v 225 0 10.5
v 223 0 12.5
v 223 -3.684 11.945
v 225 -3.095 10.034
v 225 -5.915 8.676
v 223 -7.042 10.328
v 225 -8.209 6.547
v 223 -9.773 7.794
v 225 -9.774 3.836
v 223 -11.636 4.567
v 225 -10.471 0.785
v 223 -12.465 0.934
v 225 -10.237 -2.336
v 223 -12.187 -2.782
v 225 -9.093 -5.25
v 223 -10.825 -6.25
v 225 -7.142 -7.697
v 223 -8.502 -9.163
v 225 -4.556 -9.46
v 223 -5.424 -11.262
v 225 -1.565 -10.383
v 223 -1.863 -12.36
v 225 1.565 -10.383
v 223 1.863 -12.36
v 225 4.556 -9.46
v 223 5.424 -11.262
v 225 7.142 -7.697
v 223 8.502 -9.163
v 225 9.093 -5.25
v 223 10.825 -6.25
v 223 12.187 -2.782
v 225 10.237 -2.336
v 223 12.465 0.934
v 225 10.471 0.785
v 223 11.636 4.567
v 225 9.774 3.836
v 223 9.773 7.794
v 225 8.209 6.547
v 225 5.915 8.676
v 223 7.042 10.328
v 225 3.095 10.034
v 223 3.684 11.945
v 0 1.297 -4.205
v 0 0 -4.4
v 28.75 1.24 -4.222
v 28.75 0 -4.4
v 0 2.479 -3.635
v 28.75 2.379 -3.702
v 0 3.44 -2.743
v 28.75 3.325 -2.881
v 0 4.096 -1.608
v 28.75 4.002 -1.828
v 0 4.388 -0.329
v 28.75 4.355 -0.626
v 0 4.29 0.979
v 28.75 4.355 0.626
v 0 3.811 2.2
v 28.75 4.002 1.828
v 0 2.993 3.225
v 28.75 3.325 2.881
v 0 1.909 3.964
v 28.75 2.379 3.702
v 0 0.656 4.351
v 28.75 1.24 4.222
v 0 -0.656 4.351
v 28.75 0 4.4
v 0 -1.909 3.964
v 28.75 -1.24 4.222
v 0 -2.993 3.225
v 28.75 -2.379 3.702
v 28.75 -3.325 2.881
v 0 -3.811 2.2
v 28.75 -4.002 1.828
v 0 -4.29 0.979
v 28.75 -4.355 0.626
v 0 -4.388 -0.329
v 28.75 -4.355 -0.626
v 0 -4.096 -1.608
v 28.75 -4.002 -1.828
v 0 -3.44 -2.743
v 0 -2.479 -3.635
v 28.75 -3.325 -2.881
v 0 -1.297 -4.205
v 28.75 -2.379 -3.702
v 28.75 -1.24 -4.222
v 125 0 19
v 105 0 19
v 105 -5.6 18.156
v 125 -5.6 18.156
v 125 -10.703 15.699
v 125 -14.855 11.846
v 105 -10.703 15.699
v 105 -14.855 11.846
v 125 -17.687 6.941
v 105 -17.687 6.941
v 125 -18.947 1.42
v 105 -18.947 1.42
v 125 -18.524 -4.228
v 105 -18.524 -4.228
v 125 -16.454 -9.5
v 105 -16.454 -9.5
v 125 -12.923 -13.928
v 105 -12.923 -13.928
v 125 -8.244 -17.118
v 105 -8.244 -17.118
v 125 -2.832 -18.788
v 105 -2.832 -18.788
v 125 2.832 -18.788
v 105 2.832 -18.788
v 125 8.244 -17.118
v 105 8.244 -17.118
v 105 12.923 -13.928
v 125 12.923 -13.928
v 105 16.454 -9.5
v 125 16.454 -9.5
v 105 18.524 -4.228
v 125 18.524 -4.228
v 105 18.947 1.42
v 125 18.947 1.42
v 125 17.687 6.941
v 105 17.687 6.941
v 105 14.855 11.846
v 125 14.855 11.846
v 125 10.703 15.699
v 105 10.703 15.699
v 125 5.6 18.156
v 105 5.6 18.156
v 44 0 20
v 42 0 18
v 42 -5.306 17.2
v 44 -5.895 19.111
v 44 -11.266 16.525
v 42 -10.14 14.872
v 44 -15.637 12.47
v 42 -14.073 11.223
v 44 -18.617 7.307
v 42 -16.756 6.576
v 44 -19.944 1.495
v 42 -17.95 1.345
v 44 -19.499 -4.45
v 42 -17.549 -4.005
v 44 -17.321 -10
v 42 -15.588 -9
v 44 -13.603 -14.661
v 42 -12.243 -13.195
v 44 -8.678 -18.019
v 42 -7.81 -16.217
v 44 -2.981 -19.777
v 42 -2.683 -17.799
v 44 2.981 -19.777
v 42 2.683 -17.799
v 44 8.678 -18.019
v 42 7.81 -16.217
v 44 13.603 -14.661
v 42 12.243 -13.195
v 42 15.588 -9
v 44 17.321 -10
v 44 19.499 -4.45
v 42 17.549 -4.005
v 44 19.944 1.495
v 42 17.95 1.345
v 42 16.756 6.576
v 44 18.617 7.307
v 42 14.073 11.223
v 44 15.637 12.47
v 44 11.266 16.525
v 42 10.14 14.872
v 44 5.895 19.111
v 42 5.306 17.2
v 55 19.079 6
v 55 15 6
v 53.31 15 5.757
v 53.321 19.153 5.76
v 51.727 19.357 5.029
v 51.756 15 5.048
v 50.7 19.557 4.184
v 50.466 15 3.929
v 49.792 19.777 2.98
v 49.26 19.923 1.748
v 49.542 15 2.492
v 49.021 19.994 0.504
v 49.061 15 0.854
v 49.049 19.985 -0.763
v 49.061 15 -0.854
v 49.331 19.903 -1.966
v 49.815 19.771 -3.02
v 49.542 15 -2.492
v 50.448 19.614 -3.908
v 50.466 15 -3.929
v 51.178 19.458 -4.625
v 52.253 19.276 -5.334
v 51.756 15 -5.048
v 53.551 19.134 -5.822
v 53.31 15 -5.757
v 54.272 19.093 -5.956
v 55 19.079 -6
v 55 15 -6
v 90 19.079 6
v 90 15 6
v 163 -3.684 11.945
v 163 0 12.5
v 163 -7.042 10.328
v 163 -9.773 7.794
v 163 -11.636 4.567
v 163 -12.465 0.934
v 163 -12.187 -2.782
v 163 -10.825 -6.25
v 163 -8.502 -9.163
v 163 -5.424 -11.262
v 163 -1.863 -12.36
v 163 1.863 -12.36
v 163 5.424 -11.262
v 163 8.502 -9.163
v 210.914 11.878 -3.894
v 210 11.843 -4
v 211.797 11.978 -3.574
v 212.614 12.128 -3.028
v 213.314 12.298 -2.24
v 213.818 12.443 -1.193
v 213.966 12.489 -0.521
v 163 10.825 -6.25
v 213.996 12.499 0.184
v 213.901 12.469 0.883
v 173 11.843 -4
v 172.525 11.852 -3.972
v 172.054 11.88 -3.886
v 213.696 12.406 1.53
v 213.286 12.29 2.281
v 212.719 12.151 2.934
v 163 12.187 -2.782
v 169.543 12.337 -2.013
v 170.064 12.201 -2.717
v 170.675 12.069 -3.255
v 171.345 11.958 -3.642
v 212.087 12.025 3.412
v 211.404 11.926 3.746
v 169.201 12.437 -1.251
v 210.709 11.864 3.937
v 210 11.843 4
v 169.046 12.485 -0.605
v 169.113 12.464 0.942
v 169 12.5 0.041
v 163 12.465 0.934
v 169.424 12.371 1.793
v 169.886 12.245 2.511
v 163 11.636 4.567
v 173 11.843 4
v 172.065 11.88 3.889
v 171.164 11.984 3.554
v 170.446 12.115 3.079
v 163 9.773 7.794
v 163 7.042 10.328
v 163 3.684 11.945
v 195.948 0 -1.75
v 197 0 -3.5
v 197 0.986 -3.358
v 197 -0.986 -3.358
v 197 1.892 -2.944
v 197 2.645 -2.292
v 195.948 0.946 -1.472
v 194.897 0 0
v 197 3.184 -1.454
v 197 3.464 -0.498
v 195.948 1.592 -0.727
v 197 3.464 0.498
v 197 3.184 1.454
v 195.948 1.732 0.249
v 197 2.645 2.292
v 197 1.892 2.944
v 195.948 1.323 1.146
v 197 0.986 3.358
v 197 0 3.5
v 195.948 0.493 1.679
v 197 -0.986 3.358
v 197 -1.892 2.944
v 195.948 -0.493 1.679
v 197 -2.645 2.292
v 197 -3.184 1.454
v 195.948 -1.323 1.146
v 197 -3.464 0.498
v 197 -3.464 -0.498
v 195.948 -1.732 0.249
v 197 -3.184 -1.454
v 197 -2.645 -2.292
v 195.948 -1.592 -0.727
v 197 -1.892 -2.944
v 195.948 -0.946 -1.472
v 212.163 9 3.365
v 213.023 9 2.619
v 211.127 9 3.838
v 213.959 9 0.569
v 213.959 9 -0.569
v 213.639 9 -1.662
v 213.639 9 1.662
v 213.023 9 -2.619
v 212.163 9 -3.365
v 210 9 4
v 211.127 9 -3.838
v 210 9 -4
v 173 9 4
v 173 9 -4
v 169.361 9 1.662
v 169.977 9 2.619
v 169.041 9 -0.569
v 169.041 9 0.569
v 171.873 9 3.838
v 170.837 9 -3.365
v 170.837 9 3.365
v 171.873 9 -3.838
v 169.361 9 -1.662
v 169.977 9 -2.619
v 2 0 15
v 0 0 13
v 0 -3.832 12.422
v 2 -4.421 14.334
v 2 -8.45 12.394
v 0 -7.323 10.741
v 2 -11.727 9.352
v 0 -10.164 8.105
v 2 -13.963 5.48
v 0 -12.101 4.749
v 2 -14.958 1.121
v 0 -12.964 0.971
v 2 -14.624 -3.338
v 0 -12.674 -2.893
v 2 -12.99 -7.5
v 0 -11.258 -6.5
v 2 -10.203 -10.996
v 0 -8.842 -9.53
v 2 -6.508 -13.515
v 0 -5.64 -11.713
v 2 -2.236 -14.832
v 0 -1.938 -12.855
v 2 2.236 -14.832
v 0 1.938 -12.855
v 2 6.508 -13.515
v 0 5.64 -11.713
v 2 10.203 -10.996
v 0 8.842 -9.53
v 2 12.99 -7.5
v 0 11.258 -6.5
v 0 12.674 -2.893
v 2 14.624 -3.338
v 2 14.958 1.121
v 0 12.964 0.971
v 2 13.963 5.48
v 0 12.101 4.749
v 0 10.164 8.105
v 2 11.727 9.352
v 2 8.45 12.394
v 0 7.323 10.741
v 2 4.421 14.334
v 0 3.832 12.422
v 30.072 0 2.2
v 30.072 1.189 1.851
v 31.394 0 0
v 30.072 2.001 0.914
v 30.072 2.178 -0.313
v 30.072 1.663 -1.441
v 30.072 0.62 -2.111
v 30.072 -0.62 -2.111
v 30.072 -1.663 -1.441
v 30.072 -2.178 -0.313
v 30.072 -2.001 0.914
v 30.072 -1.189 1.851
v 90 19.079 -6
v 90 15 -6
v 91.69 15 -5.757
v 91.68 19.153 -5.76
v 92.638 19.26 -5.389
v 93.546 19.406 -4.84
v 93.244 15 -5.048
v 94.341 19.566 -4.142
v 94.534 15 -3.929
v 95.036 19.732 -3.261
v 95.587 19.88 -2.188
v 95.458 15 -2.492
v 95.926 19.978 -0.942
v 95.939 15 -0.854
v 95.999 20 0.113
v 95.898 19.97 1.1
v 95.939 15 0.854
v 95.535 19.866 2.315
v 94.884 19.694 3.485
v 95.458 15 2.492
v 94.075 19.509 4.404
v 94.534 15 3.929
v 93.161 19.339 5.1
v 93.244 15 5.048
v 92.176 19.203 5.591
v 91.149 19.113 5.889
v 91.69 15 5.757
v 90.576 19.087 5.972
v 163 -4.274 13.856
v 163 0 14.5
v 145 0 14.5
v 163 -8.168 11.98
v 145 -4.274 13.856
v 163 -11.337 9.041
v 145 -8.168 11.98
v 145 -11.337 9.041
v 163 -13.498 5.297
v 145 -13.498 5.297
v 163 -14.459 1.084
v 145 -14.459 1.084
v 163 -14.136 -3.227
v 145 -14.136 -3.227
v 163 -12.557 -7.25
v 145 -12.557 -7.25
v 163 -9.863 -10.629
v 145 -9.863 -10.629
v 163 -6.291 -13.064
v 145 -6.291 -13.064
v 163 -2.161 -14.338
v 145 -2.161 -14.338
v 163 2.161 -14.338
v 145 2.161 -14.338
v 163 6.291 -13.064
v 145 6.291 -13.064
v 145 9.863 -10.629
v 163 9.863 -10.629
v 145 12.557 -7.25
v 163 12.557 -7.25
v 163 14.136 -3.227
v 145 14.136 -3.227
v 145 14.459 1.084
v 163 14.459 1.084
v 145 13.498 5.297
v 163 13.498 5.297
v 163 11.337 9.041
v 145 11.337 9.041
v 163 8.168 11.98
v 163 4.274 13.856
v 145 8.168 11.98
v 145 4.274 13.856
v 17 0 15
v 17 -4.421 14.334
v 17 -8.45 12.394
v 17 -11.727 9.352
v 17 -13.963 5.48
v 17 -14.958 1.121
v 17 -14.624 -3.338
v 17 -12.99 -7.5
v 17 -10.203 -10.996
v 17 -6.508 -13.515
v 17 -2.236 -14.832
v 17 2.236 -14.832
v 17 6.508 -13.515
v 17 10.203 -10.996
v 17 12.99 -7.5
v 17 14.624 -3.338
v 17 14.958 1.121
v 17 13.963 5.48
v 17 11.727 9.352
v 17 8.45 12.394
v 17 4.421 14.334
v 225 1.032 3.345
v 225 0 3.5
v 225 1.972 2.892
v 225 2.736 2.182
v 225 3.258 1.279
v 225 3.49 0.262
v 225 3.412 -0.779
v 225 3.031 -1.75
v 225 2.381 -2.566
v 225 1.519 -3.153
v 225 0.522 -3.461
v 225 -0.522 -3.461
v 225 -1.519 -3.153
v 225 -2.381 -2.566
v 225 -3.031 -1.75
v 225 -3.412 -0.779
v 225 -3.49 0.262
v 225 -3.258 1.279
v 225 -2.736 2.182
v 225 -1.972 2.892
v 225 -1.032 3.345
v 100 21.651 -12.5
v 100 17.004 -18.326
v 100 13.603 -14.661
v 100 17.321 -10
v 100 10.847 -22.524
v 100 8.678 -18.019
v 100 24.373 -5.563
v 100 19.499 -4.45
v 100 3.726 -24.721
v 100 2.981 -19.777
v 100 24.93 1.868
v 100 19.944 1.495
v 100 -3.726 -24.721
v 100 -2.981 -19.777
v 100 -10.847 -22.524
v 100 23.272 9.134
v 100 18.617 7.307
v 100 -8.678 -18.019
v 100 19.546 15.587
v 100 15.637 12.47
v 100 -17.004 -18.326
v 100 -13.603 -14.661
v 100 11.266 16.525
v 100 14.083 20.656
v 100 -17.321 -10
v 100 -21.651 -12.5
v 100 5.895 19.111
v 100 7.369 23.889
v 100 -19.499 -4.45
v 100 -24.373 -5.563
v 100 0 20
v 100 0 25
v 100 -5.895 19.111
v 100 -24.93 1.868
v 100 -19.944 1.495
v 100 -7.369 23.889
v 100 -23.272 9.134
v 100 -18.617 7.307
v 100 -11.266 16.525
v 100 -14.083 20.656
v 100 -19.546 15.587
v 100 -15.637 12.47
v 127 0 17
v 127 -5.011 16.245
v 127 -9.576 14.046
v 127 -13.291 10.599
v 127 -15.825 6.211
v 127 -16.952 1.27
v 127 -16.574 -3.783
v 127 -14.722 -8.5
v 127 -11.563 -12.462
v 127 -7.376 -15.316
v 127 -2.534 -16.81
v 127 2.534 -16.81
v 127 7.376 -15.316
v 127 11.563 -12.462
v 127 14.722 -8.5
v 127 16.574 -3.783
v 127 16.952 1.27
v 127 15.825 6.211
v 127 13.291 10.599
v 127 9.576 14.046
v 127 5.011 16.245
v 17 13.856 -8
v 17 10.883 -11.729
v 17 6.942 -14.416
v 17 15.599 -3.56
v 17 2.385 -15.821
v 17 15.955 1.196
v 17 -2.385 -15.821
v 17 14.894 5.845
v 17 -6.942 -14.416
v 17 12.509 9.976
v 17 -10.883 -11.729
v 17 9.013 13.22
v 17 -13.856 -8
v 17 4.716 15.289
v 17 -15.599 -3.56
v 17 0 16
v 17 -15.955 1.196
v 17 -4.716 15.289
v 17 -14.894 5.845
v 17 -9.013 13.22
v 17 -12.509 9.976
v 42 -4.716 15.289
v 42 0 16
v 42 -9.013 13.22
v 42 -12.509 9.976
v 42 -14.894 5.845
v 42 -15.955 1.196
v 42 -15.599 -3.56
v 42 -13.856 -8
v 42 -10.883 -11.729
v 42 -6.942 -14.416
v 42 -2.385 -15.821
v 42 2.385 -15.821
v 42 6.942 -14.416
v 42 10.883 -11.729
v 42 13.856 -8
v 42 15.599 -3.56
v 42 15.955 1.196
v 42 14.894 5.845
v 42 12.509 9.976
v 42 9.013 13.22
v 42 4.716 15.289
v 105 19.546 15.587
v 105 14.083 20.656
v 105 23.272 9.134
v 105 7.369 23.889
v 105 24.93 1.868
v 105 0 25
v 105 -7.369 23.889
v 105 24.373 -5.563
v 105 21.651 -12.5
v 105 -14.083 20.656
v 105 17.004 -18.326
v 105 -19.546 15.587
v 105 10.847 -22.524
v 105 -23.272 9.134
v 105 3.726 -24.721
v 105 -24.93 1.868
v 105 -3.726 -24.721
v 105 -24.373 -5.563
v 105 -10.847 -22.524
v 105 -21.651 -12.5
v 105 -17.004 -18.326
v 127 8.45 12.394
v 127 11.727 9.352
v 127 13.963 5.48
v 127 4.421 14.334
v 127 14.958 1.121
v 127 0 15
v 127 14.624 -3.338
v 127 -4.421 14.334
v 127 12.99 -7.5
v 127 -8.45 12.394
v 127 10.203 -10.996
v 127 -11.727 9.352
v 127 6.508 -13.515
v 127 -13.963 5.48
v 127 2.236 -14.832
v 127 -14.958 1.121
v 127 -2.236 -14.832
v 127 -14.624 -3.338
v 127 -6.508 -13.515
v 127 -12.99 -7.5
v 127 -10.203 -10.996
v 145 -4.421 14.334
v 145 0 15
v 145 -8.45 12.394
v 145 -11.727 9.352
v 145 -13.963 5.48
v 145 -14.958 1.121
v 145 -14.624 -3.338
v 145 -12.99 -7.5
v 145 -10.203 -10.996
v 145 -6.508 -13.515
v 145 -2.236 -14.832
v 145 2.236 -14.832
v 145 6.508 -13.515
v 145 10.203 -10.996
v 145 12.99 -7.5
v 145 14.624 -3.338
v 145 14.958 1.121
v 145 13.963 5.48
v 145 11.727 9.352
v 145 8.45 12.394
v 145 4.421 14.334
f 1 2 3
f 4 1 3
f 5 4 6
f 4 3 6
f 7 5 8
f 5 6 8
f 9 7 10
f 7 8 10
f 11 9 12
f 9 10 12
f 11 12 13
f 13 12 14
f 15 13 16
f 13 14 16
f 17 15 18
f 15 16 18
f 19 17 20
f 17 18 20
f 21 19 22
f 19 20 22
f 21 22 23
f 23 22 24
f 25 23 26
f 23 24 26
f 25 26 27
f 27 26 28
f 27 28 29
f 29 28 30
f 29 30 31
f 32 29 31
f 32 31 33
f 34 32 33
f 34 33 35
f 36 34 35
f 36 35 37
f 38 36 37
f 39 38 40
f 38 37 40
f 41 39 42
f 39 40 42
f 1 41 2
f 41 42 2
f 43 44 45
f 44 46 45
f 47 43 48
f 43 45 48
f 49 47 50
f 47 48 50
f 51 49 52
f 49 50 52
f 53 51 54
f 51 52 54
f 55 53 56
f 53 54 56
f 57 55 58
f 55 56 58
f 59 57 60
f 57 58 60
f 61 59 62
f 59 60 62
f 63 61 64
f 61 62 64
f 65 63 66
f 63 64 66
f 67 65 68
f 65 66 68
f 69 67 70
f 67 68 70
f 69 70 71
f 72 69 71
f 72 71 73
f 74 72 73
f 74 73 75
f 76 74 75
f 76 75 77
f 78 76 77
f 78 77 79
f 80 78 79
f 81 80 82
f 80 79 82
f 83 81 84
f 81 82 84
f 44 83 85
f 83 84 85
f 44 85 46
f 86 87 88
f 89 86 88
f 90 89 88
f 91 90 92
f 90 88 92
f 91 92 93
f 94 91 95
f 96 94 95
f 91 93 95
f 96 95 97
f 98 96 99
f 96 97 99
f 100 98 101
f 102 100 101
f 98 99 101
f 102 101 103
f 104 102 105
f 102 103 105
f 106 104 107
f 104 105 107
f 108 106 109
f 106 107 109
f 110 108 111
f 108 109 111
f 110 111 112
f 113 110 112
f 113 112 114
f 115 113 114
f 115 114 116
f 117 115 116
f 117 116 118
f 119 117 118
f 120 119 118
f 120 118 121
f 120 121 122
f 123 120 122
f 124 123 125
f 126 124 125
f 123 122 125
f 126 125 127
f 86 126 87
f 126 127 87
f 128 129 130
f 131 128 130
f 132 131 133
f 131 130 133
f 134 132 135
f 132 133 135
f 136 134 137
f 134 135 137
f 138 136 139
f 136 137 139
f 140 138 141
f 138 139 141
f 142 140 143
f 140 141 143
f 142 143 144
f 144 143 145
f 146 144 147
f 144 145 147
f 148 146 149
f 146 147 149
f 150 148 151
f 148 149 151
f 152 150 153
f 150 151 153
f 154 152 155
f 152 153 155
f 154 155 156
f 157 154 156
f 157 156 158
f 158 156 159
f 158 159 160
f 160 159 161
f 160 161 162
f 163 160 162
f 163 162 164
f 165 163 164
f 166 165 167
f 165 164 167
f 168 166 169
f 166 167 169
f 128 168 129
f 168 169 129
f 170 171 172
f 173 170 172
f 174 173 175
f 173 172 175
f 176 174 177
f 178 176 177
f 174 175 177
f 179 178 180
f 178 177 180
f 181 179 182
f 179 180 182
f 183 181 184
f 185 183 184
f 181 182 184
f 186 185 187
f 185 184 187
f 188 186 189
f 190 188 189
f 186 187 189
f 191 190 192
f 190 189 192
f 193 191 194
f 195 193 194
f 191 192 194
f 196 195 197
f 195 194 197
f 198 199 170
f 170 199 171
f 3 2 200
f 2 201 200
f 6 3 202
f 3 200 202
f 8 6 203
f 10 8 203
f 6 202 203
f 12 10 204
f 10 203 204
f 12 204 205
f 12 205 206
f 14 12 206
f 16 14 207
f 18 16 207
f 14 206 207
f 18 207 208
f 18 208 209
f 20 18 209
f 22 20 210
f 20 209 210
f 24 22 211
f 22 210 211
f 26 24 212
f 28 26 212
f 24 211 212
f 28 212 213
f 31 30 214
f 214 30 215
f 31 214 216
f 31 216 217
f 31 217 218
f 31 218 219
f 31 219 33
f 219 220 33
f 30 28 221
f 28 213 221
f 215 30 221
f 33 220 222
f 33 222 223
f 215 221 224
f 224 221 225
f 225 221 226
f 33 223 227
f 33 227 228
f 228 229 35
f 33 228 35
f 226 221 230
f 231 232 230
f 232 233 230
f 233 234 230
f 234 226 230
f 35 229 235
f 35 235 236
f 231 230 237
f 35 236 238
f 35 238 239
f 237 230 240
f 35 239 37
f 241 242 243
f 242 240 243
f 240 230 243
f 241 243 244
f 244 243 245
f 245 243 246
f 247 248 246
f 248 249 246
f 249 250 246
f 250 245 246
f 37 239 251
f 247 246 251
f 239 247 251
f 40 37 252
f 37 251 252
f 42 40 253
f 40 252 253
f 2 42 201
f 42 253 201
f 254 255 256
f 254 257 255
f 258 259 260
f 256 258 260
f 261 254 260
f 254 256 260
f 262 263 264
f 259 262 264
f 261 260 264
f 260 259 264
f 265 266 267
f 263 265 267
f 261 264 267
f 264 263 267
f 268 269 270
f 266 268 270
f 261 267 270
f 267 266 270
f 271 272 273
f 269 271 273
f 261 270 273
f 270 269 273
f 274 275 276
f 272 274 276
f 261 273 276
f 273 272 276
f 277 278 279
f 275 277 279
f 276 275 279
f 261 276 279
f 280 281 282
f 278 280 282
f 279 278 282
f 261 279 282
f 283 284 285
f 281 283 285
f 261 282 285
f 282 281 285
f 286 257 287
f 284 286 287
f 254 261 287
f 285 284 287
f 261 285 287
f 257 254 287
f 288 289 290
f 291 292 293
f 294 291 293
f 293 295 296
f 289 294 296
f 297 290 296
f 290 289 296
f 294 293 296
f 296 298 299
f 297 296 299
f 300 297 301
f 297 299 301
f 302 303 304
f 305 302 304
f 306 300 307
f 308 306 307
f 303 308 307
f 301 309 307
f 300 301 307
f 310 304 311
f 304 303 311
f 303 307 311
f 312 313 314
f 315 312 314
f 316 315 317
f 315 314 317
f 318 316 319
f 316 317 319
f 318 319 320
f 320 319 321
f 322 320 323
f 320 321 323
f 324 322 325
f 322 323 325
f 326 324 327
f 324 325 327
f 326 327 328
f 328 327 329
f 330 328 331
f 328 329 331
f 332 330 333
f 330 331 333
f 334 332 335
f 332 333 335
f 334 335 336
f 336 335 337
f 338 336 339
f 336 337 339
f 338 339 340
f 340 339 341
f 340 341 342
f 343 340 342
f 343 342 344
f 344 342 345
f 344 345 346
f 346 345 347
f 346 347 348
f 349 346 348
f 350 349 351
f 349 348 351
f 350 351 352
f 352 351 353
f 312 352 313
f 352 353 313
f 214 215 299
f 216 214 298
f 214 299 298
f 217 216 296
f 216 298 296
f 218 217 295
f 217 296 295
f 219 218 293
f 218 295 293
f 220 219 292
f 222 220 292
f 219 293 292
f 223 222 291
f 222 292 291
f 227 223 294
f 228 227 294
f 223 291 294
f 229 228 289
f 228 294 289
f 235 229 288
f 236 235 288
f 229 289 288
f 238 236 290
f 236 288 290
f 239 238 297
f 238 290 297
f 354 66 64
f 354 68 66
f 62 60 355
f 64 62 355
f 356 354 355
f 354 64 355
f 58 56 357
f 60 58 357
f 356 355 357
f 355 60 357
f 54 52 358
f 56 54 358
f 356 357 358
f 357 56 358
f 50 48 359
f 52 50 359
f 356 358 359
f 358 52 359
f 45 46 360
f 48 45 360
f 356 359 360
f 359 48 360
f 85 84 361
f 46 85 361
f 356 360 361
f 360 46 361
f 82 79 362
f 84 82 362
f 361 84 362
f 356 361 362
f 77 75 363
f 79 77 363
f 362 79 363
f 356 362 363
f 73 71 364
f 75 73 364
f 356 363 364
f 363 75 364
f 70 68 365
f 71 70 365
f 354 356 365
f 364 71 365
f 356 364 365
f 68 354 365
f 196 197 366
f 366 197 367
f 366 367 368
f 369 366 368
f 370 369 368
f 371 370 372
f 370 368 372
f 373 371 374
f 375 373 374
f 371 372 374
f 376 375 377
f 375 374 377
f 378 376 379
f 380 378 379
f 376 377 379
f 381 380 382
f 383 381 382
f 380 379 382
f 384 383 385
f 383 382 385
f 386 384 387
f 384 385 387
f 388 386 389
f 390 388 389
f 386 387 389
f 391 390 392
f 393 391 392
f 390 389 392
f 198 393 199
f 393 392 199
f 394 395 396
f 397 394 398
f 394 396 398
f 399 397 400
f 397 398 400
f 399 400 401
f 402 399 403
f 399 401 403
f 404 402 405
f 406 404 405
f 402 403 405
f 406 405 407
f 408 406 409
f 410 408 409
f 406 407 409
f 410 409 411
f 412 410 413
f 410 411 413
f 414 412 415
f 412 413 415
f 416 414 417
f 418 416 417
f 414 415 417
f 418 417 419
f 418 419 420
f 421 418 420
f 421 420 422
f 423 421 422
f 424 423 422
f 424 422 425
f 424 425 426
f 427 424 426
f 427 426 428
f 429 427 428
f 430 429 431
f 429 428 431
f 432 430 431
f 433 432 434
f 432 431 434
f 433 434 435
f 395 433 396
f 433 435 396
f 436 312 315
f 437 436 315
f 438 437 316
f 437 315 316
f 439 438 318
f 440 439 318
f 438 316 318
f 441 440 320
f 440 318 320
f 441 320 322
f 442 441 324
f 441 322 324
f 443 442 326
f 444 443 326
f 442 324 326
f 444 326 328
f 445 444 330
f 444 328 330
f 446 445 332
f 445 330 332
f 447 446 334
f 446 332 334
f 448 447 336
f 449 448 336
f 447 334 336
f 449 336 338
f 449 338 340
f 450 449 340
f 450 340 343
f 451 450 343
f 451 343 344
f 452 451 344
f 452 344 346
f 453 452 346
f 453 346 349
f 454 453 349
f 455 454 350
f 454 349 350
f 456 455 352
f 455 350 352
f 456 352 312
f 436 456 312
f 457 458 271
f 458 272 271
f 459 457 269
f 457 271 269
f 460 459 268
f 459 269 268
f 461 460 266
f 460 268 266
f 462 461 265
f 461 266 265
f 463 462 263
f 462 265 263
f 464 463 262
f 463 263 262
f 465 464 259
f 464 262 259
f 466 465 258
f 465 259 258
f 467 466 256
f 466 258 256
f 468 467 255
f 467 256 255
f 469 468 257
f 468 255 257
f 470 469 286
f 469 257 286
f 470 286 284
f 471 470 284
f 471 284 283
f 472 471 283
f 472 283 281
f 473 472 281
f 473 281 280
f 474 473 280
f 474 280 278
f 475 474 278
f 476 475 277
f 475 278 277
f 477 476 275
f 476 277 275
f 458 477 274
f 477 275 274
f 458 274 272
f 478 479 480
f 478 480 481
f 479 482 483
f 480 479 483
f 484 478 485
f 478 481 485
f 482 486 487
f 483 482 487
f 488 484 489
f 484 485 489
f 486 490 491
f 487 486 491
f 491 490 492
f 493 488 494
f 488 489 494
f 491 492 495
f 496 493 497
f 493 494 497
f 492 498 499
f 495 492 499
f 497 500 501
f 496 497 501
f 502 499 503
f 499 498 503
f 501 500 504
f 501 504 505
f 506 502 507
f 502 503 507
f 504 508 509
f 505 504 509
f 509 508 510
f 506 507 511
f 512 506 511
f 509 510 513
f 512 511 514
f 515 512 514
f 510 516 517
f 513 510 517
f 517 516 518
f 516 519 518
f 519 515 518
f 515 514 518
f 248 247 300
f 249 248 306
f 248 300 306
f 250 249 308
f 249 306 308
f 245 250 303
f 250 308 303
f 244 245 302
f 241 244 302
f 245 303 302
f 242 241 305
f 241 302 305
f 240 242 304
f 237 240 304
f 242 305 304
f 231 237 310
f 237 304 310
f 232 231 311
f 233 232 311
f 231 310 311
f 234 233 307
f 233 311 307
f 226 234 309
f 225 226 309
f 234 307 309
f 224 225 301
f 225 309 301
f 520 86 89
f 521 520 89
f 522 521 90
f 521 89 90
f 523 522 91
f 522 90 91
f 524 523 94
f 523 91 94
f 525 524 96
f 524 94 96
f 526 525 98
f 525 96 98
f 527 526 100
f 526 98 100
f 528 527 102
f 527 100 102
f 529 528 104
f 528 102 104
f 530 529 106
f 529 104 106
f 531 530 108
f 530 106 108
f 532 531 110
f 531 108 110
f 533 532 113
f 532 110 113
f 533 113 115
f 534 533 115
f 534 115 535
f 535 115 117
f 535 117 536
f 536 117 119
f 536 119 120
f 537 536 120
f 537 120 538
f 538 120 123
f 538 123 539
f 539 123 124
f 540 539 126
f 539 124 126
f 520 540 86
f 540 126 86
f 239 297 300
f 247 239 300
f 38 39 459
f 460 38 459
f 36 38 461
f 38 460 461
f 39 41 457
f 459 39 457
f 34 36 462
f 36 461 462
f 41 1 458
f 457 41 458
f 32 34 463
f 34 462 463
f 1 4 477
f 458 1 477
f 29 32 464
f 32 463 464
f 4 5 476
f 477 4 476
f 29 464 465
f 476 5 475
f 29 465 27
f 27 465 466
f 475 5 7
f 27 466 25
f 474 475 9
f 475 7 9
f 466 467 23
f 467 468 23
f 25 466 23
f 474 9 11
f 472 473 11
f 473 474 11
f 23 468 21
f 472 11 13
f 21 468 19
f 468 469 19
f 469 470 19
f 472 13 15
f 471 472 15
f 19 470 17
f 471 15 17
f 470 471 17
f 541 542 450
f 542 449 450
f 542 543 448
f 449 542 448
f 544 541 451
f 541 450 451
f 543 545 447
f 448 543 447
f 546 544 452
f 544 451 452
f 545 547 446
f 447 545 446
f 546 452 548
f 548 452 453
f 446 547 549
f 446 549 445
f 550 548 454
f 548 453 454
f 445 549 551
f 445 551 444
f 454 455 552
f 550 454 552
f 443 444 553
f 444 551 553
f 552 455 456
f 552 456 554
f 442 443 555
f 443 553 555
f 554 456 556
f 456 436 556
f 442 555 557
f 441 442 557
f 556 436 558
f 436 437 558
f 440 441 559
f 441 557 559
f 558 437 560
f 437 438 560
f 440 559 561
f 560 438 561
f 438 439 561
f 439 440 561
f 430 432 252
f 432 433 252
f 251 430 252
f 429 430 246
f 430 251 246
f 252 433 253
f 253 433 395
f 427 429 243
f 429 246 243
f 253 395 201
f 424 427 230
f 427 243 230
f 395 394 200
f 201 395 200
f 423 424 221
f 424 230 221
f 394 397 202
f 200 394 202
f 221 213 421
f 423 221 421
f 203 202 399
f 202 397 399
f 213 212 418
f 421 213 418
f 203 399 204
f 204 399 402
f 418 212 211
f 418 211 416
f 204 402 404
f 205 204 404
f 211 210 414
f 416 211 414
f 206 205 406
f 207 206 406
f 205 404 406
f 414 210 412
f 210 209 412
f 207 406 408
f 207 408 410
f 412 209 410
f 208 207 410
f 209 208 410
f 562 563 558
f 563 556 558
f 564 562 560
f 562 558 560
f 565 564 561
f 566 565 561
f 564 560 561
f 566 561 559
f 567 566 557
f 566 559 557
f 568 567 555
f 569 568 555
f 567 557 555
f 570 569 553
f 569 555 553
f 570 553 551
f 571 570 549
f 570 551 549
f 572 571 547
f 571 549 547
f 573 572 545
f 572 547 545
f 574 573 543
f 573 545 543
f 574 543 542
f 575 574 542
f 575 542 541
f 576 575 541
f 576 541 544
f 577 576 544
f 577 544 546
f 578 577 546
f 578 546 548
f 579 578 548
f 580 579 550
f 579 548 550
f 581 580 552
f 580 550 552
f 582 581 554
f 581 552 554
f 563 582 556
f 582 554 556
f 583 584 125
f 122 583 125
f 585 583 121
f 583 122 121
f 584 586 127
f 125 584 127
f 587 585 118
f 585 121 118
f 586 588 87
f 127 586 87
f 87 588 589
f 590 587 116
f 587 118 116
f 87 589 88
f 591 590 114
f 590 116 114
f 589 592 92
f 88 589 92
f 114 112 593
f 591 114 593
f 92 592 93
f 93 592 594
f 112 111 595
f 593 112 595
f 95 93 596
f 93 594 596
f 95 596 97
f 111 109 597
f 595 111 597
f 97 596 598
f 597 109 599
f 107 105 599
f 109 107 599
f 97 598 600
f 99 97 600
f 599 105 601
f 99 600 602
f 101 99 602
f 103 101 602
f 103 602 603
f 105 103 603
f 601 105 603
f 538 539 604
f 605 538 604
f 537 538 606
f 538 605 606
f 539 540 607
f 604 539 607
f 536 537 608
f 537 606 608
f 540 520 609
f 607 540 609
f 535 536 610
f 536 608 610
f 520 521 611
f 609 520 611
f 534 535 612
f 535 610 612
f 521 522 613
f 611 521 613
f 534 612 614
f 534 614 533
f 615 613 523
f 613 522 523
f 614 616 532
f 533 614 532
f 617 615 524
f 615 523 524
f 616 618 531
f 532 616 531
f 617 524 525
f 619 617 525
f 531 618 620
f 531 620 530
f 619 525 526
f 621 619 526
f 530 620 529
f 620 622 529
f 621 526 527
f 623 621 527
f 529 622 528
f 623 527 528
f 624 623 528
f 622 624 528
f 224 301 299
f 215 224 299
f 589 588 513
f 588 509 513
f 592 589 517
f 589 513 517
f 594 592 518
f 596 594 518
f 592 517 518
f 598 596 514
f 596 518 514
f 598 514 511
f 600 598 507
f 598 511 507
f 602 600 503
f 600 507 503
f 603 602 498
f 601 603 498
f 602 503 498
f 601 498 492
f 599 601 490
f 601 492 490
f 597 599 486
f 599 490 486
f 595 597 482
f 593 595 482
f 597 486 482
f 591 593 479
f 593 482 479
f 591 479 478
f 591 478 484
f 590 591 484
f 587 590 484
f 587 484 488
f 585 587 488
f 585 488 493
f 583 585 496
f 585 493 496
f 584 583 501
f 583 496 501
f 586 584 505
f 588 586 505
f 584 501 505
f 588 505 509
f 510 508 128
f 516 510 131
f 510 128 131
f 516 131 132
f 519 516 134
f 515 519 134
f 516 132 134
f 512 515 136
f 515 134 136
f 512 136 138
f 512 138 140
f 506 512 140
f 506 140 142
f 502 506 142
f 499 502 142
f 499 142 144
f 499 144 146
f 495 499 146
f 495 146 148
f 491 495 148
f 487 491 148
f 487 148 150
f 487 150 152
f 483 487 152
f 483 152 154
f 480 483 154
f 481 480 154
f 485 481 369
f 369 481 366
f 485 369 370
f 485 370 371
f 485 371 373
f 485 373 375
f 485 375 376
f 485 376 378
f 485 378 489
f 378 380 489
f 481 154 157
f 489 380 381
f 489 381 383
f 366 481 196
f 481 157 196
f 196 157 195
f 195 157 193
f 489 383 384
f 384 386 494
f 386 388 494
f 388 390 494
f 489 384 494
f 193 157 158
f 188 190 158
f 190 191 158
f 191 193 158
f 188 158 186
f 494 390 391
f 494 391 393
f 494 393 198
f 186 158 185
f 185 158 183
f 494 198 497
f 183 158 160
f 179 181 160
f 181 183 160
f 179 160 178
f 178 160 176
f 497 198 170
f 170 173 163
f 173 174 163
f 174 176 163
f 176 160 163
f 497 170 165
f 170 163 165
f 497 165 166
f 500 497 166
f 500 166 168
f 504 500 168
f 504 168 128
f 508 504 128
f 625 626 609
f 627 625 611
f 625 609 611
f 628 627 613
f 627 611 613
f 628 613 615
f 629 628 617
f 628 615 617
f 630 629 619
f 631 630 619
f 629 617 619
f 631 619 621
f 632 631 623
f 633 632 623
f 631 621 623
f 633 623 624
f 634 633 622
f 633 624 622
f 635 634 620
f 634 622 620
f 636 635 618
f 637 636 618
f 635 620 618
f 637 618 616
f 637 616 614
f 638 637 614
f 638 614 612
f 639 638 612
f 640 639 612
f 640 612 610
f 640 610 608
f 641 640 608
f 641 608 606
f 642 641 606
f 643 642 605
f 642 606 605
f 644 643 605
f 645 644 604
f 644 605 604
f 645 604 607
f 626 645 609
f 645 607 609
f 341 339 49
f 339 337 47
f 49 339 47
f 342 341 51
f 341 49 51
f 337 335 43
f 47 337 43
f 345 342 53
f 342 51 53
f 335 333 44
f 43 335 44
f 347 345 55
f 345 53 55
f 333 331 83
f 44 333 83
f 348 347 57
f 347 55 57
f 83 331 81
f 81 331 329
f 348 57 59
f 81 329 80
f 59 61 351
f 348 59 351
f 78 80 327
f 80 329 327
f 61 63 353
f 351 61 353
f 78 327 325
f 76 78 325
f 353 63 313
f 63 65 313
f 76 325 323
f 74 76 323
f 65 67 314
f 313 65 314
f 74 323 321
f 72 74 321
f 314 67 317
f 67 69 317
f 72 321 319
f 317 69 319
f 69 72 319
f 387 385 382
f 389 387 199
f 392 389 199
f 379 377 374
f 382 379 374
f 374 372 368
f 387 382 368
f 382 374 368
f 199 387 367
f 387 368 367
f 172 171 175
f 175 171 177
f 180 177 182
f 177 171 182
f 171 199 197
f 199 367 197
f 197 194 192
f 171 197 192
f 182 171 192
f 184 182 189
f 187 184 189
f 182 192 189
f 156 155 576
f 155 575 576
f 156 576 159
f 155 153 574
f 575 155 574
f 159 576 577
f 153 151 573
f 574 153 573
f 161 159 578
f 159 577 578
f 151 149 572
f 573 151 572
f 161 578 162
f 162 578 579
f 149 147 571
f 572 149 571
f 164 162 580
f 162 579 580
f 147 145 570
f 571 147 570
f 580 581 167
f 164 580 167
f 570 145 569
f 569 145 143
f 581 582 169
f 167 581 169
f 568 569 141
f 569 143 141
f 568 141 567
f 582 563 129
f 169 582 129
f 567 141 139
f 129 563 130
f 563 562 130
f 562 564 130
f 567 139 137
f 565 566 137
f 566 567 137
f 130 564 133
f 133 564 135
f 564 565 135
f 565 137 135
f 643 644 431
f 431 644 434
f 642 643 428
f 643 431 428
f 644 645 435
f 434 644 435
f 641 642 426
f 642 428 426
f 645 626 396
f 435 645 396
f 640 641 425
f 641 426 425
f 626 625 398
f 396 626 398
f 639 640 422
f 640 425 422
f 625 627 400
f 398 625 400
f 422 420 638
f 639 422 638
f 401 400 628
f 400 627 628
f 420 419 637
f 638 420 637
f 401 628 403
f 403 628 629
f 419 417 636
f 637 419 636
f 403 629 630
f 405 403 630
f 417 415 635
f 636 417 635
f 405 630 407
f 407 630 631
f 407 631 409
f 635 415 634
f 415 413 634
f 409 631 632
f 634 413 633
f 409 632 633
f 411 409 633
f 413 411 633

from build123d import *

# Parameters (mm, degrees)
PAH1_SIZE                   = 2
KES_EKSTR_ZYON1_START       = 15
KES_EKSTR_ZYON1_DEPTH       = 10
KES_EKSTR_ZYON2_START       = 9
KES_EKSTR_ZYON2_DEPTH       = 10
M8X1_0_DI_LI_DELIK1_D       = 7
M8X1_0_DI_LI_DELIK1_DEPTH   = 28
M8X1_0_DI_LI_DELIK1_TIP     = 2.103012167
M10X1_25_DI_LI_DELIK1_D     = 8.8
M10X1_25_DI_LI_DELIK1_DEPTH = 28.75
M10X1_25_DI_LI_DELIK1_TIP   = 2.643786724


with BuildPart() as part:
    # Çizim1 → Döndür1 (revolve)
    with BuildSketch(Plane(origin=(0, 0, 0), x_dir=(1, 0, 0), z_dir=(0, 0, -1)), mode=Mode.PRIVATE) as d_nd_r1_sk:
        Polygon((0, 0), (225, 0), (225, 12.5), (163, 12.5), (163, 14.5), (145, 14.5), (145, 15), (127, 15), (127, 19), (105, 19), (105, 25), (100, 25), (100, 20), (42, 20), (42, 16), (17, 16), (17, 15), (0, 15), align=None)
    revolve(d_nd_r1_sk.sketch.rotate(Axis((0, 0, 0), (1, 0, 0)), 270), axis=Axis((0, 0, 0), (1, 0, 0)))

    # Pah1
    pah1_edges = [part.edges().sort_by_distance(p)[0] for p in [
        (225, 0, -12.5),
        (127, 0, -19),
        (42, 0, -20),
        (0, 0, -15),
    ]]
    chamfer(pah1_edges, length=PAH1_SIZE)

    # Çizim2 → Kes-Ekstrüzyon1 (cut)
    with BuildSketch(Plane(origin=(0, 0, 0), x_dir=(1, 0, 0), z_dir=(0, 1, 0)).offset(KES_EKSTR_ZYON1_START)):
        with BuildLine():
            Line((55, 6), (90, 6))
            ThreePointArc((90, 6), (96, 0), (90, -6))
            Line((90, -6), (55, -6))
            ThreePointArc((55, -6), (49, 0), (55, 6))
        make_face()
    extrude(amount=KES_EKSTR_ZYON1_DEPTH, mode=Mode.SUBTRACT)

    # Çizim3 → Kes-Ekstrüzyon2 (cut)
    with BuildSketch(Plane(origin=(0, 0, 0), x_dir=(1, 0, 0), z_dir=(0, 1, 0)).offset(KES_EKSTR_ZYON2_START)):
        with BuildLine():
            Line((173, 4), (210, 4))
            ThreePointArc((210, 4), (214, 0), (210, -4))
            Line((210, -4), (173, -4))
            ThreePointArc((173, -4), (169, 0), (173, 4))
        make_face()
    extrude(amount=KES_EKSTR_ZYON2_DEPTH, mode=Mode.SUBTRACT)

    # M8x1.0 Dişli Delik1
    with Locations(Plane(origin=(225, 0, 0), x_dir=(0, 0, -1), z_dir=(1, 0, 0))):
        with Locations((0, 0)):
            Hole(M8X1_0_DI_LI_DELIK1_D / 2, depth=M8X1_0_DI_LI_DELIK1_DEPTH)
            with Locations((0, 0, -(M8X1_0_DI_LI_DELIK1_DEPTH + M8X1_0_DI_LI_DELIK1_TIP / 2))):  # 118° drill point
                Cone(0, M8X1_0_DI_LI_DELIK1_D / 2, M8X1_0_DI_LI_DELIK1_TIP, mode=Mode.SUBTRACT)

    # M10x1.25 Dişli Delik1
    with Locations(Plane.ZY):
        with Locations((0, 0)):
            Hole(M10X1_25_DI_LI_DELIK1_D / 2, depth=M10X1_25_DI_LI_DELIK1_DEPTH)
            with Locations((0, 0, -(M10X1_25_DI_LI_DELIK1_DEPTH + M10X1_25_DI_LI_DELIK1_TIP / 2))):  # 118° drill point
                Cone(0, M10X1_25_DI_LI_DELIK1_D / 2, M10X1_25_DI_LI_DELIK1_TIP, mode=Mode.SUBTRACT)


solid = part.part
